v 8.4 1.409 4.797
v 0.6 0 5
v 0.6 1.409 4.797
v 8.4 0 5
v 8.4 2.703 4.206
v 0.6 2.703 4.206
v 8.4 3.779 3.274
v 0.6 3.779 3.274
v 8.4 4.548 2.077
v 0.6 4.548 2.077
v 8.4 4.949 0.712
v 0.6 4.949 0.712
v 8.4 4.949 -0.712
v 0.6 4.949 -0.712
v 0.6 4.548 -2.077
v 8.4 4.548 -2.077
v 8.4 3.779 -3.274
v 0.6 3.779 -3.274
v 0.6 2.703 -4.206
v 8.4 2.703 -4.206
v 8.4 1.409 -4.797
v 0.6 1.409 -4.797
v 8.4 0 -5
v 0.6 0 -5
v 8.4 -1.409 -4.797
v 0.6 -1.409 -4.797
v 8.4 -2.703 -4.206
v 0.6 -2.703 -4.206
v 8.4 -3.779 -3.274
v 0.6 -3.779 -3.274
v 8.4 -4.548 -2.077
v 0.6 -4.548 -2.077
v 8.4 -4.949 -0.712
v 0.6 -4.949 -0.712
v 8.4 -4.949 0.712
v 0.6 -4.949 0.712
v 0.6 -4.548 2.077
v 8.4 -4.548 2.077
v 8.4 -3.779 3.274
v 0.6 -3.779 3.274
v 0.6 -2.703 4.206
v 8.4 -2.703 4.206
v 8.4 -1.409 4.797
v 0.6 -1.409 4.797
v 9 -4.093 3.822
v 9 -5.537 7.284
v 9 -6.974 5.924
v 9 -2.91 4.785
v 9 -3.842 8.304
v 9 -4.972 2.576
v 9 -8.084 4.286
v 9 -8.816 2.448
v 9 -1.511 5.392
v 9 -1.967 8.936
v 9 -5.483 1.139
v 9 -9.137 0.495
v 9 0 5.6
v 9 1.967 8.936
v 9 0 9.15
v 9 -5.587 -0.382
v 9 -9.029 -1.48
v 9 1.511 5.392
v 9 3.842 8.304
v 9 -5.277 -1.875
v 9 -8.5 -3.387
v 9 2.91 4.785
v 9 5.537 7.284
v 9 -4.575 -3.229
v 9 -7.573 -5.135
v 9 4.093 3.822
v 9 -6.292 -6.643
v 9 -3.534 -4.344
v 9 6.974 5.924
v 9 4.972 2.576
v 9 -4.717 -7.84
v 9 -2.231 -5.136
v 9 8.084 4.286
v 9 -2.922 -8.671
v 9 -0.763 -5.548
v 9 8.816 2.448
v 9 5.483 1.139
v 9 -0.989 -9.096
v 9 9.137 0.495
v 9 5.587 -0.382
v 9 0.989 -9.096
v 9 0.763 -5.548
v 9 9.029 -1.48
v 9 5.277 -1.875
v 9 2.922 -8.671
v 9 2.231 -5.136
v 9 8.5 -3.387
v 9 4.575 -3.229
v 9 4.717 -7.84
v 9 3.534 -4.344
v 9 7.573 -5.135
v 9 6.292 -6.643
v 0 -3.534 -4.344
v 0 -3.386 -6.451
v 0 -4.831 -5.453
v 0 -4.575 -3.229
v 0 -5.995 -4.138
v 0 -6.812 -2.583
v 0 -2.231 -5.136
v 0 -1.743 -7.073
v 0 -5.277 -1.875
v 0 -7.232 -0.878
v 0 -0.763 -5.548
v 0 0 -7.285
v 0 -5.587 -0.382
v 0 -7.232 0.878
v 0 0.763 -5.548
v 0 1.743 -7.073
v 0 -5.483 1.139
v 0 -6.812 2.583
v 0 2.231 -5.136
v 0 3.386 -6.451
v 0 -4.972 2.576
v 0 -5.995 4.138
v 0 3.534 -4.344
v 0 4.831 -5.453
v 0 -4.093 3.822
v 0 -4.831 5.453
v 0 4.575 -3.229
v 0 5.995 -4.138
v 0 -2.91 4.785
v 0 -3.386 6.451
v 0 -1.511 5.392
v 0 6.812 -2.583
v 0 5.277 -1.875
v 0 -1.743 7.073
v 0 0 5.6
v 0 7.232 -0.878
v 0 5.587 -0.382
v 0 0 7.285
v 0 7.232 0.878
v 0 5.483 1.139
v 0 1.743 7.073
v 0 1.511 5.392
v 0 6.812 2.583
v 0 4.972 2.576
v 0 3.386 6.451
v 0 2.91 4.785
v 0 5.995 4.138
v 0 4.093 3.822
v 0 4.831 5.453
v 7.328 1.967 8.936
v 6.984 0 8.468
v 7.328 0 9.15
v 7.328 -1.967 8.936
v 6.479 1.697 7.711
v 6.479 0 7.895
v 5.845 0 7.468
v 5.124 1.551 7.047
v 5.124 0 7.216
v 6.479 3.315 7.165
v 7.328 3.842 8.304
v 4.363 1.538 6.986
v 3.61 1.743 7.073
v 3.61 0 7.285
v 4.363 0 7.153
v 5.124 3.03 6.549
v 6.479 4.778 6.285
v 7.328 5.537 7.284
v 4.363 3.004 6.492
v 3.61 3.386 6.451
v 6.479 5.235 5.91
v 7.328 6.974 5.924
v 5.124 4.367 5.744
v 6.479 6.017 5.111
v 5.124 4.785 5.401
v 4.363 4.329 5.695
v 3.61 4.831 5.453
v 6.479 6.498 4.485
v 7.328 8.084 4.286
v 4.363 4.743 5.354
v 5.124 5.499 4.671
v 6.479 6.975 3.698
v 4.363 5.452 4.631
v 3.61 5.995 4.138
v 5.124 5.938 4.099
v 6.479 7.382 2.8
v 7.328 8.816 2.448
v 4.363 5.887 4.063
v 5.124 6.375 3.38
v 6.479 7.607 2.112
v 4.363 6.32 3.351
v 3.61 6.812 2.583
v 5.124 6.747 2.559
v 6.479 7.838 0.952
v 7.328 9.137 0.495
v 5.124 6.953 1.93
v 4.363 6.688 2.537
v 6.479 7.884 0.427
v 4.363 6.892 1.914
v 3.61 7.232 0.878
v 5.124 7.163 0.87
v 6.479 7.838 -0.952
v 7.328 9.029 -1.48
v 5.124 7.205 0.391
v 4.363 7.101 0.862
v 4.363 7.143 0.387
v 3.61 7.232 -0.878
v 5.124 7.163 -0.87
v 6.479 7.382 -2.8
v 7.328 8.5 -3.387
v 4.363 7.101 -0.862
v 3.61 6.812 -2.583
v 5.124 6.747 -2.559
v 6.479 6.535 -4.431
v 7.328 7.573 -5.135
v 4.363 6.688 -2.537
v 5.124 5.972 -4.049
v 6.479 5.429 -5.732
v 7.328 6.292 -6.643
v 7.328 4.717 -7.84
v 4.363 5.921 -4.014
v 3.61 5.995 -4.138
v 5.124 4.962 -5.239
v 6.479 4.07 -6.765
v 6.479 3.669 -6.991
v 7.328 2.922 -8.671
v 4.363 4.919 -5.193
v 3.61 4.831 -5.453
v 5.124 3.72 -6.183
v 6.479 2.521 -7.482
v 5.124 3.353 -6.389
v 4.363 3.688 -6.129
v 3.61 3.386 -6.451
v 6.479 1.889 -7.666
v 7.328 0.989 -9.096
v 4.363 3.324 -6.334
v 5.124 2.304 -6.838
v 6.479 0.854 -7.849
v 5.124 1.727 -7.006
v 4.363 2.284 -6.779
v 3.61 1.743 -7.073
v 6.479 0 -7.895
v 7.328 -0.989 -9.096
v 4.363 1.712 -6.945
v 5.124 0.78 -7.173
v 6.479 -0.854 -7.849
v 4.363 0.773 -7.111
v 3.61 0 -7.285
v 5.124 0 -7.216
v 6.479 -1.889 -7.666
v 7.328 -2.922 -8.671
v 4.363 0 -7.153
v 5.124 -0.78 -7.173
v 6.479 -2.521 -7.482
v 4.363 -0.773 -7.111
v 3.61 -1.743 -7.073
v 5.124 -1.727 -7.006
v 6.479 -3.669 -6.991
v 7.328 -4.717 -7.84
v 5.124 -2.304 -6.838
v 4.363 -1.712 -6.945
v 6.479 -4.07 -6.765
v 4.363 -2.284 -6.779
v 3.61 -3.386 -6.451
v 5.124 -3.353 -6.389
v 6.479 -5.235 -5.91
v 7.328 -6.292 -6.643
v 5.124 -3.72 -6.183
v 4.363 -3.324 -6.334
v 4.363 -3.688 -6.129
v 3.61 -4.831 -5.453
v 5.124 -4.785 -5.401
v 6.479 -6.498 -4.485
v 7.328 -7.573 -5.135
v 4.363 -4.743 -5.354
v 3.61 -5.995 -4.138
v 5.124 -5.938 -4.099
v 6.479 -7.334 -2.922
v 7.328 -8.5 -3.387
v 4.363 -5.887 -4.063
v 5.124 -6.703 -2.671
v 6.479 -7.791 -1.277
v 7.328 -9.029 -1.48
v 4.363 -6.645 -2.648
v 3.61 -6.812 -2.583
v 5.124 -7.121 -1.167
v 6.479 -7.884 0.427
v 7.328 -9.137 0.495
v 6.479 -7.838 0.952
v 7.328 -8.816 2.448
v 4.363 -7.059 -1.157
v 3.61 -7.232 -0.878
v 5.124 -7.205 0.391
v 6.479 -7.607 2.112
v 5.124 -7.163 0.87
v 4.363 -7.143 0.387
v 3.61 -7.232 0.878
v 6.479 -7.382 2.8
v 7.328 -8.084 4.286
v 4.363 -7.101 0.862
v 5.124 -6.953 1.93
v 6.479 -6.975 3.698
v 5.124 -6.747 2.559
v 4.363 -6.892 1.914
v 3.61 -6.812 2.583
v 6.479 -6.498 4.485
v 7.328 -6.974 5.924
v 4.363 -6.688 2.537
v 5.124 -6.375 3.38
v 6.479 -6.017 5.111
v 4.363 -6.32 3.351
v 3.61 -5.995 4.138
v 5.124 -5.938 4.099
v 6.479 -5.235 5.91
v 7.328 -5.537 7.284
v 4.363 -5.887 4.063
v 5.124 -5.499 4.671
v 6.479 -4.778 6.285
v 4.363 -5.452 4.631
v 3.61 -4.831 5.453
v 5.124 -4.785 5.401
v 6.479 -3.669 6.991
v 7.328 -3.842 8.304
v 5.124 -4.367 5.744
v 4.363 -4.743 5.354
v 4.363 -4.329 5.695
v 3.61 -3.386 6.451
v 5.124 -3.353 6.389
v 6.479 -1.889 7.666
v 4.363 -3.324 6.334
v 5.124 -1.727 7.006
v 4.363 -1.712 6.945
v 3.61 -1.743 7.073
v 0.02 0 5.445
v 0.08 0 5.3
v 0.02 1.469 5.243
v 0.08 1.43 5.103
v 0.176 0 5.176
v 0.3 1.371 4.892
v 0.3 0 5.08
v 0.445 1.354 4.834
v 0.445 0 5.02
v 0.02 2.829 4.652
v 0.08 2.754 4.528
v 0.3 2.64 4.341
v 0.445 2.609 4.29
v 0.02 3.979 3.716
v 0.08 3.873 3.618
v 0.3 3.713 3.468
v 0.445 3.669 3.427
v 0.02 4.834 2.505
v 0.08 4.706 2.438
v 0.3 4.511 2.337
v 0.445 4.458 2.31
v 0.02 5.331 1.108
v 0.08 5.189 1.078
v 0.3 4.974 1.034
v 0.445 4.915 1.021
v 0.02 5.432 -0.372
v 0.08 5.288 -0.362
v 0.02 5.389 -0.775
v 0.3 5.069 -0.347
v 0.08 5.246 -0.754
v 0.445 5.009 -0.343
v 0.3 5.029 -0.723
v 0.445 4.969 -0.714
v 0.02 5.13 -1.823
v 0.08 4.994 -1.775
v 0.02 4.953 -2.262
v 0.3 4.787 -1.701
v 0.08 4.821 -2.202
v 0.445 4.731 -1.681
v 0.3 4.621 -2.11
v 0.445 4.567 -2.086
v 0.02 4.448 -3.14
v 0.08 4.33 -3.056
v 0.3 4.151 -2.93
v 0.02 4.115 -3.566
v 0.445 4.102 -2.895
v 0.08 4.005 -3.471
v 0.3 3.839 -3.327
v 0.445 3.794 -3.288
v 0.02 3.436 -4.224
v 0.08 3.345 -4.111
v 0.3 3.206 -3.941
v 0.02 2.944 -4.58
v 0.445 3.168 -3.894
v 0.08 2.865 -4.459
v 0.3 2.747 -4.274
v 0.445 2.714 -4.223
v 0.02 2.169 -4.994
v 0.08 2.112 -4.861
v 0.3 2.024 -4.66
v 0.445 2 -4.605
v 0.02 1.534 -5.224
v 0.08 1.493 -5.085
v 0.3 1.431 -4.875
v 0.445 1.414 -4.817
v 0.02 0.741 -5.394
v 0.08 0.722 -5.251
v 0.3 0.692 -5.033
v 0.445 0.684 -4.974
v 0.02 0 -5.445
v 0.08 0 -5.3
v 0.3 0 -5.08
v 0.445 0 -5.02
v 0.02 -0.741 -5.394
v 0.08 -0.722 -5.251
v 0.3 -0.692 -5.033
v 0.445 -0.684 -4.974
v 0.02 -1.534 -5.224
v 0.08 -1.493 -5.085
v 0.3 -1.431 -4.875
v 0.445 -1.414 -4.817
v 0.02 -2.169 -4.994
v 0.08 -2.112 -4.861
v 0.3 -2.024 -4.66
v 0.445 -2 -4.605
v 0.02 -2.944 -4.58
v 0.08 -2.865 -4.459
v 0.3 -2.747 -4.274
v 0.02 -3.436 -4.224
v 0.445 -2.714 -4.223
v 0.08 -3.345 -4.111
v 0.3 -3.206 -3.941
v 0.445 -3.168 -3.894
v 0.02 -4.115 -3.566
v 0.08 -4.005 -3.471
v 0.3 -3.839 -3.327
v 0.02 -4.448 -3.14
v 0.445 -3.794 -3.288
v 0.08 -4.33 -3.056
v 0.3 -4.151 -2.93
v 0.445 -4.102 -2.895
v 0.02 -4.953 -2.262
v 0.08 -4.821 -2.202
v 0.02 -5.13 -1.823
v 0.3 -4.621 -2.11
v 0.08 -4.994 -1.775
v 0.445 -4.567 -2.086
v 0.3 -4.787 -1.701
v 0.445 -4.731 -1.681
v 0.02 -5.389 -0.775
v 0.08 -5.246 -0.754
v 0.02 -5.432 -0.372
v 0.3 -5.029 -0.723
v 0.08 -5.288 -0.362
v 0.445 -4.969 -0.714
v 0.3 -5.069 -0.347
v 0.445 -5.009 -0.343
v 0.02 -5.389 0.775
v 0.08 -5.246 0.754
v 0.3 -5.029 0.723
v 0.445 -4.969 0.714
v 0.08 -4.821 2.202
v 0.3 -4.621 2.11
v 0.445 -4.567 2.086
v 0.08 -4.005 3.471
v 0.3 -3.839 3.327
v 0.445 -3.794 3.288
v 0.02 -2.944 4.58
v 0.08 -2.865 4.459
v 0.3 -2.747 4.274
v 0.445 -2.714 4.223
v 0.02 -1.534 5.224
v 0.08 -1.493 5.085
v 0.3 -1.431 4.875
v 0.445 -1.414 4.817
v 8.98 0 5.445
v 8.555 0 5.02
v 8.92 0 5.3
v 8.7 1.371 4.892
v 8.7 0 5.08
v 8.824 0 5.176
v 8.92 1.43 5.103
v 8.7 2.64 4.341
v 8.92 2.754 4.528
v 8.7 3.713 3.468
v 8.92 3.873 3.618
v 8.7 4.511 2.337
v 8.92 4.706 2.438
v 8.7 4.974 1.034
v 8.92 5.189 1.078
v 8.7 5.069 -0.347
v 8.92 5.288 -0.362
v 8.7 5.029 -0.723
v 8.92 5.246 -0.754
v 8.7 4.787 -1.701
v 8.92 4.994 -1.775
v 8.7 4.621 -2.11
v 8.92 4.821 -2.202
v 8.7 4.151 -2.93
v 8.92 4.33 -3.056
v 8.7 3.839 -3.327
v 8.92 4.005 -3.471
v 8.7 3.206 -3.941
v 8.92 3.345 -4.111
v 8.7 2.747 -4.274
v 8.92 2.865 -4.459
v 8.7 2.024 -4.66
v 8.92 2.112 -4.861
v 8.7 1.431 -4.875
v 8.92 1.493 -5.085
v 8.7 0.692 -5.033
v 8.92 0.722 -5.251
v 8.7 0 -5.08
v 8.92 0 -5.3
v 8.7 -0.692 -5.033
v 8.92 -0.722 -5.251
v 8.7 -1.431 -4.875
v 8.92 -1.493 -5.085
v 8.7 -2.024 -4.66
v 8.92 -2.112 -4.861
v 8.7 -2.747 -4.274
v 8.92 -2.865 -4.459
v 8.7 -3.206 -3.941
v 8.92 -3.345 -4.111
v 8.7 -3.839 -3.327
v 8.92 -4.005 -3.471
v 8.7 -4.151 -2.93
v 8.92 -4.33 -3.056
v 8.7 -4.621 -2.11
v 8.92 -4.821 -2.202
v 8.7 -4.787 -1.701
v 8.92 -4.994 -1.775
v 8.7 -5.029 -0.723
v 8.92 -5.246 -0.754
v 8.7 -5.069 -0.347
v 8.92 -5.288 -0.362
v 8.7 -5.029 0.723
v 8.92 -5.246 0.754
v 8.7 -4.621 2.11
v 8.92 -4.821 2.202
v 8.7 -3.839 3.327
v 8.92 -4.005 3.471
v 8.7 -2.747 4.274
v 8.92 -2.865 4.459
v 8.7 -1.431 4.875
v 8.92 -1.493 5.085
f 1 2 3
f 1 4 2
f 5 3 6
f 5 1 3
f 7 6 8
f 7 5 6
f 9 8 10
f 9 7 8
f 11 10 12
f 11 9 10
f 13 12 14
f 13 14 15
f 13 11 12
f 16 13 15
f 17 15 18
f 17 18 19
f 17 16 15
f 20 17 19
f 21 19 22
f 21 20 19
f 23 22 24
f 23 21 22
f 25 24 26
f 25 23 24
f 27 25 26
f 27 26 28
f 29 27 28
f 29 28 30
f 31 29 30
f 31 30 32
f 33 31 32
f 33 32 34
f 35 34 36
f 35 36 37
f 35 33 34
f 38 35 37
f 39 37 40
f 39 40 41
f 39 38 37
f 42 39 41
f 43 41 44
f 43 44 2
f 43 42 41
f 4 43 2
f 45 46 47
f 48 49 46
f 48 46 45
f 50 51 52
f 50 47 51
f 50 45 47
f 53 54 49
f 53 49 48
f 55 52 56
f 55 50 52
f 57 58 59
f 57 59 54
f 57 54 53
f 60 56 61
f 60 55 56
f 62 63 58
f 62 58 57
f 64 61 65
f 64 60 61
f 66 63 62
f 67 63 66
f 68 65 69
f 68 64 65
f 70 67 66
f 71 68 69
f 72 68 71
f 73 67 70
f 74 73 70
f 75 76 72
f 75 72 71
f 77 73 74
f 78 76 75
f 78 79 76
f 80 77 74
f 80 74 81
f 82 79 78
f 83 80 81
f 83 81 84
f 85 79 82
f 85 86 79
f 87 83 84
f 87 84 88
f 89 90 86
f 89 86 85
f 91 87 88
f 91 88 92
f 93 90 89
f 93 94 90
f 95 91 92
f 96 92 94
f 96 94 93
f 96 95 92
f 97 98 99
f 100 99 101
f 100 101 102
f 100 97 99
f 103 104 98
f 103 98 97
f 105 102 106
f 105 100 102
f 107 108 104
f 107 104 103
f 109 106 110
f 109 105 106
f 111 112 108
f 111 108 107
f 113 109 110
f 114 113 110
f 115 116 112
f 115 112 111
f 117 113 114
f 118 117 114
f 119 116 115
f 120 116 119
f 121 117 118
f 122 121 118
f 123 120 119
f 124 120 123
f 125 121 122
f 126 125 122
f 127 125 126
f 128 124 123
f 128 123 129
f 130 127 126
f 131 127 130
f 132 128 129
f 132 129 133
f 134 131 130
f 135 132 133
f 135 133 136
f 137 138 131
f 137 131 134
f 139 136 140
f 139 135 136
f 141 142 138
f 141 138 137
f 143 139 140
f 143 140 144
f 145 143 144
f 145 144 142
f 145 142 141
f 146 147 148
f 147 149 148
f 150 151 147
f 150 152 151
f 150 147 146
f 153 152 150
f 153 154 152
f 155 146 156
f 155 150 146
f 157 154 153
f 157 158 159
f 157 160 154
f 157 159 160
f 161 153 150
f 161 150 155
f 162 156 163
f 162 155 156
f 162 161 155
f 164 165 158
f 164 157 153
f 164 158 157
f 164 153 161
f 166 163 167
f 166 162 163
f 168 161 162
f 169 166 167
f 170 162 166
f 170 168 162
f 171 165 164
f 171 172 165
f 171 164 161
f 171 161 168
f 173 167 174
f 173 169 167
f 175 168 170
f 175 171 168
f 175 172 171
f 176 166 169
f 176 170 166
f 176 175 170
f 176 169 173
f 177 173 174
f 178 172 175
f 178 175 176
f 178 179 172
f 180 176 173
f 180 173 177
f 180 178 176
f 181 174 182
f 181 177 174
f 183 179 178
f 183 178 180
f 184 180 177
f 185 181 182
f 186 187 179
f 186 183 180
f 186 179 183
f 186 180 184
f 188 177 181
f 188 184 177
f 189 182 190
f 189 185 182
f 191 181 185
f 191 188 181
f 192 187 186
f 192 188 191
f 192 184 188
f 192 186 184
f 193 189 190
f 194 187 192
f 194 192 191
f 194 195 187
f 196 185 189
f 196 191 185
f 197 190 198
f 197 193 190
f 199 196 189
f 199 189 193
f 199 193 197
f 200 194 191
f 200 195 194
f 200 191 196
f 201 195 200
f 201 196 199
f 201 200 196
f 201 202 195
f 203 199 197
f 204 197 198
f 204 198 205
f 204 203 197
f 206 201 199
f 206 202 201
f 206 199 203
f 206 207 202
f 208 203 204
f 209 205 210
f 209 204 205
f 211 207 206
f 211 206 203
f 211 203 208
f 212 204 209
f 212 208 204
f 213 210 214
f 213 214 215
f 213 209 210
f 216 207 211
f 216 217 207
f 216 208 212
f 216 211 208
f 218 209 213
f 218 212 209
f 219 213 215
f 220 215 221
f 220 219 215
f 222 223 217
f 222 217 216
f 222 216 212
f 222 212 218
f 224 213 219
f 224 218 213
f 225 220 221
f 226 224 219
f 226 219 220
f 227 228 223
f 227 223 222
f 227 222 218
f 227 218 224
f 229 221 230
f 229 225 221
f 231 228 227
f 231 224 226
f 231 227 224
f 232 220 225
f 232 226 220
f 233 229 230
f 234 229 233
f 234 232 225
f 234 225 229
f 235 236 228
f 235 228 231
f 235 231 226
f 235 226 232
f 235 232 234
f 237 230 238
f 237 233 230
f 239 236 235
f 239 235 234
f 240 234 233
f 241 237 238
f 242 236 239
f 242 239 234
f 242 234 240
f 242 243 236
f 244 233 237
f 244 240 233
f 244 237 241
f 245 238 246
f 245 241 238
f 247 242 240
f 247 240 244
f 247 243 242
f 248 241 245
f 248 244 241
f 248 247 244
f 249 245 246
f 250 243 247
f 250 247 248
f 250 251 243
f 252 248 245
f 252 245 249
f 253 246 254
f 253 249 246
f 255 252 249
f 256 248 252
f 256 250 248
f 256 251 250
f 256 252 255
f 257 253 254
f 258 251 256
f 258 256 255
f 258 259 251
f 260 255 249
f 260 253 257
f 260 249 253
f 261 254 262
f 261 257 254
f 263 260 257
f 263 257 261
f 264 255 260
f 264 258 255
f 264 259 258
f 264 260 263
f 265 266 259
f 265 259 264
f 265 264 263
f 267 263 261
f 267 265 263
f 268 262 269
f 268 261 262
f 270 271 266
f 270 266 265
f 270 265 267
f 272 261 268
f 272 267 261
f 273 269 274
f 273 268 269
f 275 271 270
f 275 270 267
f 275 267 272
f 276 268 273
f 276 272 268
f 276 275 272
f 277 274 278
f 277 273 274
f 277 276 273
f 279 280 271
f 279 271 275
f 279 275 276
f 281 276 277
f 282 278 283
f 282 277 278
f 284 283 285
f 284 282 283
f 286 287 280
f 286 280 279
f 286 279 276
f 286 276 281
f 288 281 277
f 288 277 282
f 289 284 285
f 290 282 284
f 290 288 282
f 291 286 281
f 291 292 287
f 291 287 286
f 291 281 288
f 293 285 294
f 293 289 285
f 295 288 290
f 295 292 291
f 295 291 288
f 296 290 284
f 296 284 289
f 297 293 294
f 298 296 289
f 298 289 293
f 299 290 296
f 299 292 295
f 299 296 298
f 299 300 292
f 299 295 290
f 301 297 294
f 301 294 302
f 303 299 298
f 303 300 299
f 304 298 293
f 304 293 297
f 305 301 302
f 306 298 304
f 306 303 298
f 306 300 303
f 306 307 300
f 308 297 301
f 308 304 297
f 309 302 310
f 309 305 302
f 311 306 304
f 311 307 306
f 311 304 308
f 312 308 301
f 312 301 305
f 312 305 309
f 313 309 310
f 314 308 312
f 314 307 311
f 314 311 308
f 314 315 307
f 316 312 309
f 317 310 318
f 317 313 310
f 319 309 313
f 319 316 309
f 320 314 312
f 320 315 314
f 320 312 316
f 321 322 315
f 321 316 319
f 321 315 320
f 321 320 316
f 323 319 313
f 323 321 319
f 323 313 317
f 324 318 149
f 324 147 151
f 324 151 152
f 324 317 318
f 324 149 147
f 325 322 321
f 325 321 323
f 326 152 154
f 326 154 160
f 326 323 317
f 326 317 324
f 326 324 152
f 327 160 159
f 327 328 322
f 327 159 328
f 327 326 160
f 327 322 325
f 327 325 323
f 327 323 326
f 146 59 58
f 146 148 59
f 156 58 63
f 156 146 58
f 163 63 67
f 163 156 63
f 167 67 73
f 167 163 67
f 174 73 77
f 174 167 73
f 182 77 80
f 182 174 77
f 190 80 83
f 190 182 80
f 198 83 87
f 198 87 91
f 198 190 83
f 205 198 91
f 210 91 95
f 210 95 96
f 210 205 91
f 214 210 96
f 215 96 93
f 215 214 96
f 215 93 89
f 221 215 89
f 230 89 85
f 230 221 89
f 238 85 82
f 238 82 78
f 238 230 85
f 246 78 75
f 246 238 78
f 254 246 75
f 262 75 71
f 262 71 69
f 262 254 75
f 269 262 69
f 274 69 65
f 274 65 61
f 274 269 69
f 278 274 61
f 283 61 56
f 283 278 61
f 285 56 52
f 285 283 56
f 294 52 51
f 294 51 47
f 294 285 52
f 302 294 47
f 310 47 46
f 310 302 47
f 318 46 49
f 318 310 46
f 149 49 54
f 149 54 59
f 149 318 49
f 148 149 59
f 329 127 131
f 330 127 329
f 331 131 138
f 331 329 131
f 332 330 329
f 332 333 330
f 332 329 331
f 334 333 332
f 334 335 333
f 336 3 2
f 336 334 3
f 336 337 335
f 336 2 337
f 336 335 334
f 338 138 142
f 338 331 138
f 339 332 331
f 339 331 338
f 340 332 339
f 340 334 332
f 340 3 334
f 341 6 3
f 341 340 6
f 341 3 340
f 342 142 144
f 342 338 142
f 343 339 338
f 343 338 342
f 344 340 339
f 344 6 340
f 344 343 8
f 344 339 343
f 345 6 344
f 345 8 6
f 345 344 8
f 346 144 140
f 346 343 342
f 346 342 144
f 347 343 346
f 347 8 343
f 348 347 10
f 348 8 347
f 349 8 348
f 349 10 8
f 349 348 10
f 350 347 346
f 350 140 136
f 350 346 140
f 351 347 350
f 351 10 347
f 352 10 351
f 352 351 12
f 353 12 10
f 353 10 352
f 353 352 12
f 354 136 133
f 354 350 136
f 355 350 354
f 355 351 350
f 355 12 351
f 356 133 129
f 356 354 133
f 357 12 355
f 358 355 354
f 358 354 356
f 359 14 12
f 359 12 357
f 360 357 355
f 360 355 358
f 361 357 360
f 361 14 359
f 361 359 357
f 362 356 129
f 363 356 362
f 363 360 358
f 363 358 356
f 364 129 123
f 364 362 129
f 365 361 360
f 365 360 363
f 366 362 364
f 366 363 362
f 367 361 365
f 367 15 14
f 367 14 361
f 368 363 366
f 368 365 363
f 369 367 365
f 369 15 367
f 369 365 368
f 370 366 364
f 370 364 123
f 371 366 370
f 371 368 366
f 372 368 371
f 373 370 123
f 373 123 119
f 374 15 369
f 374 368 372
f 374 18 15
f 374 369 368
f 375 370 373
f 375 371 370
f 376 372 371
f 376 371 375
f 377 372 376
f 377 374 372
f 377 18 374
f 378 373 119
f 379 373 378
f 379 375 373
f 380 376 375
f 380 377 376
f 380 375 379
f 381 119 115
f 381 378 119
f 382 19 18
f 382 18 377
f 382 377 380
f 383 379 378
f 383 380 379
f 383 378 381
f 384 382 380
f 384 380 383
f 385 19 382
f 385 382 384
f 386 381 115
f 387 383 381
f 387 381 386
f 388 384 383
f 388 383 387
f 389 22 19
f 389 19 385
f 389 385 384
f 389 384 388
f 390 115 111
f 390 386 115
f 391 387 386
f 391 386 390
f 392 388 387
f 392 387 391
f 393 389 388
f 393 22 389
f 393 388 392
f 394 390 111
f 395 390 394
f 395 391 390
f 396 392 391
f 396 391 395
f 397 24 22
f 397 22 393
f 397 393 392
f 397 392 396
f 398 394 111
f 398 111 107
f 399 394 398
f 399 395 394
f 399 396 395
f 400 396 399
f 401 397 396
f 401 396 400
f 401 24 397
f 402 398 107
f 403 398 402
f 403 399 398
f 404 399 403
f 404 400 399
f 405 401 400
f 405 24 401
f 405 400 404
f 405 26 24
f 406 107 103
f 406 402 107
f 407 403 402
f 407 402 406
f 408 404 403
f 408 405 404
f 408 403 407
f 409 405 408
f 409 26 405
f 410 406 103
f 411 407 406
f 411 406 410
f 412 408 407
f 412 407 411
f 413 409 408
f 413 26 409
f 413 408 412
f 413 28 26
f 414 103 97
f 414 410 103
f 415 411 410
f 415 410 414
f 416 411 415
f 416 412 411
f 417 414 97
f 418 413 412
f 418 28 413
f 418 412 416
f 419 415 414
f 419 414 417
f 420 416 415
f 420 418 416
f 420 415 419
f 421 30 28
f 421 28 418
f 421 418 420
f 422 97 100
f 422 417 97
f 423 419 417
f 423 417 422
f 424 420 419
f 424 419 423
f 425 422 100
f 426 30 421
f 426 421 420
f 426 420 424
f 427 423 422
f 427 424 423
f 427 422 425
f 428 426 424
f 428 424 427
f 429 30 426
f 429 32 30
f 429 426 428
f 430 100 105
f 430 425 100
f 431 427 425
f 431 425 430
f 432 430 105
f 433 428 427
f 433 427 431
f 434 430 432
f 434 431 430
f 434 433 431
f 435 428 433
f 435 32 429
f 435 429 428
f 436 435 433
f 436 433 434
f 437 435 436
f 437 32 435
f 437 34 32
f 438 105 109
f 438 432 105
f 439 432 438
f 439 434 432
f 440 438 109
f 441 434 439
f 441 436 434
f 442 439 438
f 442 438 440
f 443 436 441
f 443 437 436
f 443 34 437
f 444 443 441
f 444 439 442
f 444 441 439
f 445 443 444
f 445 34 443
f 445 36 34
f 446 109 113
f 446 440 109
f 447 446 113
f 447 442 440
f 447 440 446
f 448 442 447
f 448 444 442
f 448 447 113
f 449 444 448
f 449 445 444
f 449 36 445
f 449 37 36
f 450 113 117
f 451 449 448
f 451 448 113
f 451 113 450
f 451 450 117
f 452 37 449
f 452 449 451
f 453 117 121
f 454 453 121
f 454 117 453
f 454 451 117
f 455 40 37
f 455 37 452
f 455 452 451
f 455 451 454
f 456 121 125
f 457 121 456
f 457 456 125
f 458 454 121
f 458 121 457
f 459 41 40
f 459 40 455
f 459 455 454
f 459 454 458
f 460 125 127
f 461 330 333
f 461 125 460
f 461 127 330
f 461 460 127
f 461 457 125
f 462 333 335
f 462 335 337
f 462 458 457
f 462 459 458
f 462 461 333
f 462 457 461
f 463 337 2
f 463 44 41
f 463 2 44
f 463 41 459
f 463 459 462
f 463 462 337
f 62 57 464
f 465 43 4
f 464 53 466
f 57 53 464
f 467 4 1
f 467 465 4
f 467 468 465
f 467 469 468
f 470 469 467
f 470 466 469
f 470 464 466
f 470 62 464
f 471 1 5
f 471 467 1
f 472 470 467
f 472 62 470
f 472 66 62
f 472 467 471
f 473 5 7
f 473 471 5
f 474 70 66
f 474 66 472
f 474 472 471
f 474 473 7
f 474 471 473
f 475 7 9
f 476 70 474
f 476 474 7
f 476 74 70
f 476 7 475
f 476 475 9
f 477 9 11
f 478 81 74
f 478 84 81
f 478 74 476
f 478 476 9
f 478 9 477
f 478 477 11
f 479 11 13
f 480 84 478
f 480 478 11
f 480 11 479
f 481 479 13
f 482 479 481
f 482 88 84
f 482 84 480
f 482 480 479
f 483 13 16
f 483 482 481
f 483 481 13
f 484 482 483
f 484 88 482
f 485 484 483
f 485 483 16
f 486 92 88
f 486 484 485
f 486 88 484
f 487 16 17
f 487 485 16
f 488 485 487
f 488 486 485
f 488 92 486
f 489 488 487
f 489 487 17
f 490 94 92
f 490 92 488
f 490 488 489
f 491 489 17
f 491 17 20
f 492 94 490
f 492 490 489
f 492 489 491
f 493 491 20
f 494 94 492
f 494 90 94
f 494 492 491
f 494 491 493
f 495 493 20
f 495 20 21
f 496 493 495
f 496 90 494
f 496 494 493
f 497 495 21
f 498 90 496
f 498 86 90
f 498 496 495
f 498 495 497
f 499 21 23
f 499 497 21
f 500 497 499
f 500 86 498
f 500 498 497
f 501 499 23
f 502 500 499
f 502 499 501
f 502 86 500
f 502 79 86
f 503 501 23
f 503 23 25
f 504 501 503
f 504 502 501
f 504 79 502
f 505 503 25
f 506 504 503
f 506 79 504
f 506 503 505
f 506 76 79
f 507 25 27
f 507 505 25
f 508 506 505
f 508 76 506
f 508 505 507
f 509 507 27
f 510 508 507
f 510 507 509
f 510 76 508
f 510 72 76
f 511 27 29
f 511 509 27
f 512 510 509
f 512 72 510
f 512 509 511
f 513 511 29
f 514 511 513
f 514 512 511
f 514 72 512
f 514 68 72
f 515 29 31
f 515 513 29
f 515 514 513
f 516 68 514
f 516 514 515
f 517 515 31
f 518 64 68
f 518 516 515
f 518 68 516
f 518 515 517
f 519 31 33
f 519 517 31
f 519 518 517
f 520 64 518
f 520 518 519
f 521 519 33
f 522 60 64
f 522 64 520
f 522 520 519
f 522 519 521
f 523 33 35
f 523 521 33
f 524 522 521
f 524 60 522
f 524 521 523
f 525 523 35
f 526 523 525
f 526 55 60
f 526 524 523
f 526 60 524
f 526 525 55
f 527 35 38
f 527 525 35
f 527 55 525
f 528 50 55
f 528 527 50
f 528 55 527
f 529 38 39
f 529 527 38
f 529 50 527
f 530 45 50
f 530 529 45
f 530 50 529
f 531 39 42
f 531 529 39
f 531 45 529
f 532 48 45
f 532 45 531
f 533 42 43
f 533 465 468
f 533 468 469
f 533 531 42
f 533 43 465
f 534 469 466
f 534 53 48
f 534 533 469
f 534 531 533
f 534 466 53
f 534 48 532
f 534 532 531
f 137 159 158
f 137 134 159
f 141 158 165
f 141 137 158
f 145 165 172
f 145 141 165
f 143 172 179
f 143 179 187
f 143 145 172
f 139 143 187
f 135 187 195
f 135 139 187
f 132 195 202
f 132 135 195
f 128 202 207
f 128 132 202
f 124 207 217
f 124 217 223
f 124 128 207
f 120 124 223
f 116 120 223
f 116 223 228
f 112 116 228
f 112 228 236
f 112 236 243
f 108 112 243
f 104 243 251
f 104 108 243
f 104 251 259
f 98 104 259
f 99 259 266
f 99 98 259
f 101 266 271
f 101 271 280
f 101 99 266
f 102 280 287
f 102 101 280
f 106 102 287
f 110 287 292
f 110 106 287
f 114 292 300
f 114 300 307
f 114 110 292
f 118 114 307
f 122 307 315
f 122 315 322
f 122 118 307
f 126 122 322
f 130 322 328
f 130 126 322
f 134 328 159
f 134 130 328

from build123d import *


with BuildPart() as part:
    # Sketch1 → Revolve1 (revolve)
    with BuildSketch(Plane.XY, mode=Mode.PRIVATE) as revolve1_sk:
        with BuildLine():
            Line((0, 7.285), (0, 5.6))
            ThreePointArc((0, 5.6), (0.175735931, 5.175735931), (0.6, 5))
            Line((0.6, 5), (8.4, 5))
            ThreePointArc((8.4, 5), (8.824264069, 5.175735931), (9, 5.6))
            Line((9, 5.6), (9, 9.15))
            Line((9, 9.15), (7.328427125, 9.15))
            ThreePointArc((7.328427125, 9.15), (5.845030918, 7.468416171), (3.610182603, 7.285))
            Line((3.610182603, 7.285), (0, 7.285))
        make_face()
    revolve(revolve1_sk.sketch.rotate(Axis((9, 0, 0), (-1, 0, 0)), 270), axis=Axis((9, 0, 0), (-1, 0, 0)))


solid = part.part
